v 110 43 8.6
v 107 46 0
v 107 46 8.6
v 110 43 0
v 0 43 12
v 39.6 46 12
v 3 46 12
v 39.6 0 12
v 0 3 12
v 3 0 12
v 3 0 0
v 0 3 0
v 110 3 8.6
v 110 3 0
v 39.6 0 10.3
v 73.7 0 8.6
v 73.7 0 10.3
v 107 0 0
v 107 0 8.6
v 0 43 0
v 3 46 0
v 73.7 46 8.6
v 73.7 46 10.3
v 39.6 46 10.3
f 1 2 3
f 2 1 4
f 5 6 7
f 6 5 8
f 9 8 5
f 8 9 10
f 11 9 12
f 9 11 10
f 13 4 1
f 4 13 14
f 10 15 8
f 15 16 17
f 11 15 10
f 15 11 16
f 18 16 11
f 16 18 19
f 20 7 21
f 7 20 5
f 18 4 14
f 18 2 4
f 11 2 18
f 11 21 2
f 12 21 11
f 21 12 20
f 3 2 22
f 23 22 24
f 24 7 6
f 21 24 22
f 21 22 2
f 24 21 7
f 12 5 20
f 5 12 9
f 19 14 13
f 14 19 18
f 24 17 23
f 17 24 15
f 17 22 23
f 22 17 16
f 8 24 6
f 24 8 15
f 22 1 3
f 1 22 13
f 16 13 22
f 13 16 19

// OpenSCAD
$fn = 32;

// ----------------------------------------------------------------------
// Stepped bar: twostep, 110 x 46 x 12/8.6 mm
// ----------------------------------------------------------------------

// --- parameters (mm) ---
bar_l = 110;              // bar length, X
bar_w = 46;               // bar width, Y
plate_t = 12;             // thickness of the thick zone, Z
thin_t = 8.6;             // thickness of the thin zone
corner_c = 3;             // corner chamfer of the bar
step_cut = 3.4;           // material removed from the thin zone
stair1_x = 39.6;          // position of the first stair
stair2_x = 73.7;          // position of the second stair
mid_t = 10.3;             // thickness of the middle zone
depth_1 = 1.7;            // depth of cut 1 from the top face
depth_2 = 3.4;            // depth of cut 2 from the top face

profile = [[3, 0], [107, 0], [110, 3], [110, 43], [107, 46], [3, 46], [0, 43], [0, 3]];  // primary outline, 8 points, counter clockwise
void_1 = [[39.6, -1], [73.7, -1], [73.7, 47], [39.6, 47]];  // first stair, 4 points
void_2 = [[73.7, -1], [111, -1], [111, 47], [73.7, 47]];  // second stair, 4 points

// --- the one profile operation ---
difference() {
  linear_extrude(height = plate_t) polygon(points = profile);
  translate([0, 0, plate_t - depth_1])
    linear_extrude(height = depth_1 + 1) polygon(points = void_1);
  translate([0, 0, plate_t - depth_2])
    linear_extrude(height = depth_2 + 1) polygon(points = void_2);
}
